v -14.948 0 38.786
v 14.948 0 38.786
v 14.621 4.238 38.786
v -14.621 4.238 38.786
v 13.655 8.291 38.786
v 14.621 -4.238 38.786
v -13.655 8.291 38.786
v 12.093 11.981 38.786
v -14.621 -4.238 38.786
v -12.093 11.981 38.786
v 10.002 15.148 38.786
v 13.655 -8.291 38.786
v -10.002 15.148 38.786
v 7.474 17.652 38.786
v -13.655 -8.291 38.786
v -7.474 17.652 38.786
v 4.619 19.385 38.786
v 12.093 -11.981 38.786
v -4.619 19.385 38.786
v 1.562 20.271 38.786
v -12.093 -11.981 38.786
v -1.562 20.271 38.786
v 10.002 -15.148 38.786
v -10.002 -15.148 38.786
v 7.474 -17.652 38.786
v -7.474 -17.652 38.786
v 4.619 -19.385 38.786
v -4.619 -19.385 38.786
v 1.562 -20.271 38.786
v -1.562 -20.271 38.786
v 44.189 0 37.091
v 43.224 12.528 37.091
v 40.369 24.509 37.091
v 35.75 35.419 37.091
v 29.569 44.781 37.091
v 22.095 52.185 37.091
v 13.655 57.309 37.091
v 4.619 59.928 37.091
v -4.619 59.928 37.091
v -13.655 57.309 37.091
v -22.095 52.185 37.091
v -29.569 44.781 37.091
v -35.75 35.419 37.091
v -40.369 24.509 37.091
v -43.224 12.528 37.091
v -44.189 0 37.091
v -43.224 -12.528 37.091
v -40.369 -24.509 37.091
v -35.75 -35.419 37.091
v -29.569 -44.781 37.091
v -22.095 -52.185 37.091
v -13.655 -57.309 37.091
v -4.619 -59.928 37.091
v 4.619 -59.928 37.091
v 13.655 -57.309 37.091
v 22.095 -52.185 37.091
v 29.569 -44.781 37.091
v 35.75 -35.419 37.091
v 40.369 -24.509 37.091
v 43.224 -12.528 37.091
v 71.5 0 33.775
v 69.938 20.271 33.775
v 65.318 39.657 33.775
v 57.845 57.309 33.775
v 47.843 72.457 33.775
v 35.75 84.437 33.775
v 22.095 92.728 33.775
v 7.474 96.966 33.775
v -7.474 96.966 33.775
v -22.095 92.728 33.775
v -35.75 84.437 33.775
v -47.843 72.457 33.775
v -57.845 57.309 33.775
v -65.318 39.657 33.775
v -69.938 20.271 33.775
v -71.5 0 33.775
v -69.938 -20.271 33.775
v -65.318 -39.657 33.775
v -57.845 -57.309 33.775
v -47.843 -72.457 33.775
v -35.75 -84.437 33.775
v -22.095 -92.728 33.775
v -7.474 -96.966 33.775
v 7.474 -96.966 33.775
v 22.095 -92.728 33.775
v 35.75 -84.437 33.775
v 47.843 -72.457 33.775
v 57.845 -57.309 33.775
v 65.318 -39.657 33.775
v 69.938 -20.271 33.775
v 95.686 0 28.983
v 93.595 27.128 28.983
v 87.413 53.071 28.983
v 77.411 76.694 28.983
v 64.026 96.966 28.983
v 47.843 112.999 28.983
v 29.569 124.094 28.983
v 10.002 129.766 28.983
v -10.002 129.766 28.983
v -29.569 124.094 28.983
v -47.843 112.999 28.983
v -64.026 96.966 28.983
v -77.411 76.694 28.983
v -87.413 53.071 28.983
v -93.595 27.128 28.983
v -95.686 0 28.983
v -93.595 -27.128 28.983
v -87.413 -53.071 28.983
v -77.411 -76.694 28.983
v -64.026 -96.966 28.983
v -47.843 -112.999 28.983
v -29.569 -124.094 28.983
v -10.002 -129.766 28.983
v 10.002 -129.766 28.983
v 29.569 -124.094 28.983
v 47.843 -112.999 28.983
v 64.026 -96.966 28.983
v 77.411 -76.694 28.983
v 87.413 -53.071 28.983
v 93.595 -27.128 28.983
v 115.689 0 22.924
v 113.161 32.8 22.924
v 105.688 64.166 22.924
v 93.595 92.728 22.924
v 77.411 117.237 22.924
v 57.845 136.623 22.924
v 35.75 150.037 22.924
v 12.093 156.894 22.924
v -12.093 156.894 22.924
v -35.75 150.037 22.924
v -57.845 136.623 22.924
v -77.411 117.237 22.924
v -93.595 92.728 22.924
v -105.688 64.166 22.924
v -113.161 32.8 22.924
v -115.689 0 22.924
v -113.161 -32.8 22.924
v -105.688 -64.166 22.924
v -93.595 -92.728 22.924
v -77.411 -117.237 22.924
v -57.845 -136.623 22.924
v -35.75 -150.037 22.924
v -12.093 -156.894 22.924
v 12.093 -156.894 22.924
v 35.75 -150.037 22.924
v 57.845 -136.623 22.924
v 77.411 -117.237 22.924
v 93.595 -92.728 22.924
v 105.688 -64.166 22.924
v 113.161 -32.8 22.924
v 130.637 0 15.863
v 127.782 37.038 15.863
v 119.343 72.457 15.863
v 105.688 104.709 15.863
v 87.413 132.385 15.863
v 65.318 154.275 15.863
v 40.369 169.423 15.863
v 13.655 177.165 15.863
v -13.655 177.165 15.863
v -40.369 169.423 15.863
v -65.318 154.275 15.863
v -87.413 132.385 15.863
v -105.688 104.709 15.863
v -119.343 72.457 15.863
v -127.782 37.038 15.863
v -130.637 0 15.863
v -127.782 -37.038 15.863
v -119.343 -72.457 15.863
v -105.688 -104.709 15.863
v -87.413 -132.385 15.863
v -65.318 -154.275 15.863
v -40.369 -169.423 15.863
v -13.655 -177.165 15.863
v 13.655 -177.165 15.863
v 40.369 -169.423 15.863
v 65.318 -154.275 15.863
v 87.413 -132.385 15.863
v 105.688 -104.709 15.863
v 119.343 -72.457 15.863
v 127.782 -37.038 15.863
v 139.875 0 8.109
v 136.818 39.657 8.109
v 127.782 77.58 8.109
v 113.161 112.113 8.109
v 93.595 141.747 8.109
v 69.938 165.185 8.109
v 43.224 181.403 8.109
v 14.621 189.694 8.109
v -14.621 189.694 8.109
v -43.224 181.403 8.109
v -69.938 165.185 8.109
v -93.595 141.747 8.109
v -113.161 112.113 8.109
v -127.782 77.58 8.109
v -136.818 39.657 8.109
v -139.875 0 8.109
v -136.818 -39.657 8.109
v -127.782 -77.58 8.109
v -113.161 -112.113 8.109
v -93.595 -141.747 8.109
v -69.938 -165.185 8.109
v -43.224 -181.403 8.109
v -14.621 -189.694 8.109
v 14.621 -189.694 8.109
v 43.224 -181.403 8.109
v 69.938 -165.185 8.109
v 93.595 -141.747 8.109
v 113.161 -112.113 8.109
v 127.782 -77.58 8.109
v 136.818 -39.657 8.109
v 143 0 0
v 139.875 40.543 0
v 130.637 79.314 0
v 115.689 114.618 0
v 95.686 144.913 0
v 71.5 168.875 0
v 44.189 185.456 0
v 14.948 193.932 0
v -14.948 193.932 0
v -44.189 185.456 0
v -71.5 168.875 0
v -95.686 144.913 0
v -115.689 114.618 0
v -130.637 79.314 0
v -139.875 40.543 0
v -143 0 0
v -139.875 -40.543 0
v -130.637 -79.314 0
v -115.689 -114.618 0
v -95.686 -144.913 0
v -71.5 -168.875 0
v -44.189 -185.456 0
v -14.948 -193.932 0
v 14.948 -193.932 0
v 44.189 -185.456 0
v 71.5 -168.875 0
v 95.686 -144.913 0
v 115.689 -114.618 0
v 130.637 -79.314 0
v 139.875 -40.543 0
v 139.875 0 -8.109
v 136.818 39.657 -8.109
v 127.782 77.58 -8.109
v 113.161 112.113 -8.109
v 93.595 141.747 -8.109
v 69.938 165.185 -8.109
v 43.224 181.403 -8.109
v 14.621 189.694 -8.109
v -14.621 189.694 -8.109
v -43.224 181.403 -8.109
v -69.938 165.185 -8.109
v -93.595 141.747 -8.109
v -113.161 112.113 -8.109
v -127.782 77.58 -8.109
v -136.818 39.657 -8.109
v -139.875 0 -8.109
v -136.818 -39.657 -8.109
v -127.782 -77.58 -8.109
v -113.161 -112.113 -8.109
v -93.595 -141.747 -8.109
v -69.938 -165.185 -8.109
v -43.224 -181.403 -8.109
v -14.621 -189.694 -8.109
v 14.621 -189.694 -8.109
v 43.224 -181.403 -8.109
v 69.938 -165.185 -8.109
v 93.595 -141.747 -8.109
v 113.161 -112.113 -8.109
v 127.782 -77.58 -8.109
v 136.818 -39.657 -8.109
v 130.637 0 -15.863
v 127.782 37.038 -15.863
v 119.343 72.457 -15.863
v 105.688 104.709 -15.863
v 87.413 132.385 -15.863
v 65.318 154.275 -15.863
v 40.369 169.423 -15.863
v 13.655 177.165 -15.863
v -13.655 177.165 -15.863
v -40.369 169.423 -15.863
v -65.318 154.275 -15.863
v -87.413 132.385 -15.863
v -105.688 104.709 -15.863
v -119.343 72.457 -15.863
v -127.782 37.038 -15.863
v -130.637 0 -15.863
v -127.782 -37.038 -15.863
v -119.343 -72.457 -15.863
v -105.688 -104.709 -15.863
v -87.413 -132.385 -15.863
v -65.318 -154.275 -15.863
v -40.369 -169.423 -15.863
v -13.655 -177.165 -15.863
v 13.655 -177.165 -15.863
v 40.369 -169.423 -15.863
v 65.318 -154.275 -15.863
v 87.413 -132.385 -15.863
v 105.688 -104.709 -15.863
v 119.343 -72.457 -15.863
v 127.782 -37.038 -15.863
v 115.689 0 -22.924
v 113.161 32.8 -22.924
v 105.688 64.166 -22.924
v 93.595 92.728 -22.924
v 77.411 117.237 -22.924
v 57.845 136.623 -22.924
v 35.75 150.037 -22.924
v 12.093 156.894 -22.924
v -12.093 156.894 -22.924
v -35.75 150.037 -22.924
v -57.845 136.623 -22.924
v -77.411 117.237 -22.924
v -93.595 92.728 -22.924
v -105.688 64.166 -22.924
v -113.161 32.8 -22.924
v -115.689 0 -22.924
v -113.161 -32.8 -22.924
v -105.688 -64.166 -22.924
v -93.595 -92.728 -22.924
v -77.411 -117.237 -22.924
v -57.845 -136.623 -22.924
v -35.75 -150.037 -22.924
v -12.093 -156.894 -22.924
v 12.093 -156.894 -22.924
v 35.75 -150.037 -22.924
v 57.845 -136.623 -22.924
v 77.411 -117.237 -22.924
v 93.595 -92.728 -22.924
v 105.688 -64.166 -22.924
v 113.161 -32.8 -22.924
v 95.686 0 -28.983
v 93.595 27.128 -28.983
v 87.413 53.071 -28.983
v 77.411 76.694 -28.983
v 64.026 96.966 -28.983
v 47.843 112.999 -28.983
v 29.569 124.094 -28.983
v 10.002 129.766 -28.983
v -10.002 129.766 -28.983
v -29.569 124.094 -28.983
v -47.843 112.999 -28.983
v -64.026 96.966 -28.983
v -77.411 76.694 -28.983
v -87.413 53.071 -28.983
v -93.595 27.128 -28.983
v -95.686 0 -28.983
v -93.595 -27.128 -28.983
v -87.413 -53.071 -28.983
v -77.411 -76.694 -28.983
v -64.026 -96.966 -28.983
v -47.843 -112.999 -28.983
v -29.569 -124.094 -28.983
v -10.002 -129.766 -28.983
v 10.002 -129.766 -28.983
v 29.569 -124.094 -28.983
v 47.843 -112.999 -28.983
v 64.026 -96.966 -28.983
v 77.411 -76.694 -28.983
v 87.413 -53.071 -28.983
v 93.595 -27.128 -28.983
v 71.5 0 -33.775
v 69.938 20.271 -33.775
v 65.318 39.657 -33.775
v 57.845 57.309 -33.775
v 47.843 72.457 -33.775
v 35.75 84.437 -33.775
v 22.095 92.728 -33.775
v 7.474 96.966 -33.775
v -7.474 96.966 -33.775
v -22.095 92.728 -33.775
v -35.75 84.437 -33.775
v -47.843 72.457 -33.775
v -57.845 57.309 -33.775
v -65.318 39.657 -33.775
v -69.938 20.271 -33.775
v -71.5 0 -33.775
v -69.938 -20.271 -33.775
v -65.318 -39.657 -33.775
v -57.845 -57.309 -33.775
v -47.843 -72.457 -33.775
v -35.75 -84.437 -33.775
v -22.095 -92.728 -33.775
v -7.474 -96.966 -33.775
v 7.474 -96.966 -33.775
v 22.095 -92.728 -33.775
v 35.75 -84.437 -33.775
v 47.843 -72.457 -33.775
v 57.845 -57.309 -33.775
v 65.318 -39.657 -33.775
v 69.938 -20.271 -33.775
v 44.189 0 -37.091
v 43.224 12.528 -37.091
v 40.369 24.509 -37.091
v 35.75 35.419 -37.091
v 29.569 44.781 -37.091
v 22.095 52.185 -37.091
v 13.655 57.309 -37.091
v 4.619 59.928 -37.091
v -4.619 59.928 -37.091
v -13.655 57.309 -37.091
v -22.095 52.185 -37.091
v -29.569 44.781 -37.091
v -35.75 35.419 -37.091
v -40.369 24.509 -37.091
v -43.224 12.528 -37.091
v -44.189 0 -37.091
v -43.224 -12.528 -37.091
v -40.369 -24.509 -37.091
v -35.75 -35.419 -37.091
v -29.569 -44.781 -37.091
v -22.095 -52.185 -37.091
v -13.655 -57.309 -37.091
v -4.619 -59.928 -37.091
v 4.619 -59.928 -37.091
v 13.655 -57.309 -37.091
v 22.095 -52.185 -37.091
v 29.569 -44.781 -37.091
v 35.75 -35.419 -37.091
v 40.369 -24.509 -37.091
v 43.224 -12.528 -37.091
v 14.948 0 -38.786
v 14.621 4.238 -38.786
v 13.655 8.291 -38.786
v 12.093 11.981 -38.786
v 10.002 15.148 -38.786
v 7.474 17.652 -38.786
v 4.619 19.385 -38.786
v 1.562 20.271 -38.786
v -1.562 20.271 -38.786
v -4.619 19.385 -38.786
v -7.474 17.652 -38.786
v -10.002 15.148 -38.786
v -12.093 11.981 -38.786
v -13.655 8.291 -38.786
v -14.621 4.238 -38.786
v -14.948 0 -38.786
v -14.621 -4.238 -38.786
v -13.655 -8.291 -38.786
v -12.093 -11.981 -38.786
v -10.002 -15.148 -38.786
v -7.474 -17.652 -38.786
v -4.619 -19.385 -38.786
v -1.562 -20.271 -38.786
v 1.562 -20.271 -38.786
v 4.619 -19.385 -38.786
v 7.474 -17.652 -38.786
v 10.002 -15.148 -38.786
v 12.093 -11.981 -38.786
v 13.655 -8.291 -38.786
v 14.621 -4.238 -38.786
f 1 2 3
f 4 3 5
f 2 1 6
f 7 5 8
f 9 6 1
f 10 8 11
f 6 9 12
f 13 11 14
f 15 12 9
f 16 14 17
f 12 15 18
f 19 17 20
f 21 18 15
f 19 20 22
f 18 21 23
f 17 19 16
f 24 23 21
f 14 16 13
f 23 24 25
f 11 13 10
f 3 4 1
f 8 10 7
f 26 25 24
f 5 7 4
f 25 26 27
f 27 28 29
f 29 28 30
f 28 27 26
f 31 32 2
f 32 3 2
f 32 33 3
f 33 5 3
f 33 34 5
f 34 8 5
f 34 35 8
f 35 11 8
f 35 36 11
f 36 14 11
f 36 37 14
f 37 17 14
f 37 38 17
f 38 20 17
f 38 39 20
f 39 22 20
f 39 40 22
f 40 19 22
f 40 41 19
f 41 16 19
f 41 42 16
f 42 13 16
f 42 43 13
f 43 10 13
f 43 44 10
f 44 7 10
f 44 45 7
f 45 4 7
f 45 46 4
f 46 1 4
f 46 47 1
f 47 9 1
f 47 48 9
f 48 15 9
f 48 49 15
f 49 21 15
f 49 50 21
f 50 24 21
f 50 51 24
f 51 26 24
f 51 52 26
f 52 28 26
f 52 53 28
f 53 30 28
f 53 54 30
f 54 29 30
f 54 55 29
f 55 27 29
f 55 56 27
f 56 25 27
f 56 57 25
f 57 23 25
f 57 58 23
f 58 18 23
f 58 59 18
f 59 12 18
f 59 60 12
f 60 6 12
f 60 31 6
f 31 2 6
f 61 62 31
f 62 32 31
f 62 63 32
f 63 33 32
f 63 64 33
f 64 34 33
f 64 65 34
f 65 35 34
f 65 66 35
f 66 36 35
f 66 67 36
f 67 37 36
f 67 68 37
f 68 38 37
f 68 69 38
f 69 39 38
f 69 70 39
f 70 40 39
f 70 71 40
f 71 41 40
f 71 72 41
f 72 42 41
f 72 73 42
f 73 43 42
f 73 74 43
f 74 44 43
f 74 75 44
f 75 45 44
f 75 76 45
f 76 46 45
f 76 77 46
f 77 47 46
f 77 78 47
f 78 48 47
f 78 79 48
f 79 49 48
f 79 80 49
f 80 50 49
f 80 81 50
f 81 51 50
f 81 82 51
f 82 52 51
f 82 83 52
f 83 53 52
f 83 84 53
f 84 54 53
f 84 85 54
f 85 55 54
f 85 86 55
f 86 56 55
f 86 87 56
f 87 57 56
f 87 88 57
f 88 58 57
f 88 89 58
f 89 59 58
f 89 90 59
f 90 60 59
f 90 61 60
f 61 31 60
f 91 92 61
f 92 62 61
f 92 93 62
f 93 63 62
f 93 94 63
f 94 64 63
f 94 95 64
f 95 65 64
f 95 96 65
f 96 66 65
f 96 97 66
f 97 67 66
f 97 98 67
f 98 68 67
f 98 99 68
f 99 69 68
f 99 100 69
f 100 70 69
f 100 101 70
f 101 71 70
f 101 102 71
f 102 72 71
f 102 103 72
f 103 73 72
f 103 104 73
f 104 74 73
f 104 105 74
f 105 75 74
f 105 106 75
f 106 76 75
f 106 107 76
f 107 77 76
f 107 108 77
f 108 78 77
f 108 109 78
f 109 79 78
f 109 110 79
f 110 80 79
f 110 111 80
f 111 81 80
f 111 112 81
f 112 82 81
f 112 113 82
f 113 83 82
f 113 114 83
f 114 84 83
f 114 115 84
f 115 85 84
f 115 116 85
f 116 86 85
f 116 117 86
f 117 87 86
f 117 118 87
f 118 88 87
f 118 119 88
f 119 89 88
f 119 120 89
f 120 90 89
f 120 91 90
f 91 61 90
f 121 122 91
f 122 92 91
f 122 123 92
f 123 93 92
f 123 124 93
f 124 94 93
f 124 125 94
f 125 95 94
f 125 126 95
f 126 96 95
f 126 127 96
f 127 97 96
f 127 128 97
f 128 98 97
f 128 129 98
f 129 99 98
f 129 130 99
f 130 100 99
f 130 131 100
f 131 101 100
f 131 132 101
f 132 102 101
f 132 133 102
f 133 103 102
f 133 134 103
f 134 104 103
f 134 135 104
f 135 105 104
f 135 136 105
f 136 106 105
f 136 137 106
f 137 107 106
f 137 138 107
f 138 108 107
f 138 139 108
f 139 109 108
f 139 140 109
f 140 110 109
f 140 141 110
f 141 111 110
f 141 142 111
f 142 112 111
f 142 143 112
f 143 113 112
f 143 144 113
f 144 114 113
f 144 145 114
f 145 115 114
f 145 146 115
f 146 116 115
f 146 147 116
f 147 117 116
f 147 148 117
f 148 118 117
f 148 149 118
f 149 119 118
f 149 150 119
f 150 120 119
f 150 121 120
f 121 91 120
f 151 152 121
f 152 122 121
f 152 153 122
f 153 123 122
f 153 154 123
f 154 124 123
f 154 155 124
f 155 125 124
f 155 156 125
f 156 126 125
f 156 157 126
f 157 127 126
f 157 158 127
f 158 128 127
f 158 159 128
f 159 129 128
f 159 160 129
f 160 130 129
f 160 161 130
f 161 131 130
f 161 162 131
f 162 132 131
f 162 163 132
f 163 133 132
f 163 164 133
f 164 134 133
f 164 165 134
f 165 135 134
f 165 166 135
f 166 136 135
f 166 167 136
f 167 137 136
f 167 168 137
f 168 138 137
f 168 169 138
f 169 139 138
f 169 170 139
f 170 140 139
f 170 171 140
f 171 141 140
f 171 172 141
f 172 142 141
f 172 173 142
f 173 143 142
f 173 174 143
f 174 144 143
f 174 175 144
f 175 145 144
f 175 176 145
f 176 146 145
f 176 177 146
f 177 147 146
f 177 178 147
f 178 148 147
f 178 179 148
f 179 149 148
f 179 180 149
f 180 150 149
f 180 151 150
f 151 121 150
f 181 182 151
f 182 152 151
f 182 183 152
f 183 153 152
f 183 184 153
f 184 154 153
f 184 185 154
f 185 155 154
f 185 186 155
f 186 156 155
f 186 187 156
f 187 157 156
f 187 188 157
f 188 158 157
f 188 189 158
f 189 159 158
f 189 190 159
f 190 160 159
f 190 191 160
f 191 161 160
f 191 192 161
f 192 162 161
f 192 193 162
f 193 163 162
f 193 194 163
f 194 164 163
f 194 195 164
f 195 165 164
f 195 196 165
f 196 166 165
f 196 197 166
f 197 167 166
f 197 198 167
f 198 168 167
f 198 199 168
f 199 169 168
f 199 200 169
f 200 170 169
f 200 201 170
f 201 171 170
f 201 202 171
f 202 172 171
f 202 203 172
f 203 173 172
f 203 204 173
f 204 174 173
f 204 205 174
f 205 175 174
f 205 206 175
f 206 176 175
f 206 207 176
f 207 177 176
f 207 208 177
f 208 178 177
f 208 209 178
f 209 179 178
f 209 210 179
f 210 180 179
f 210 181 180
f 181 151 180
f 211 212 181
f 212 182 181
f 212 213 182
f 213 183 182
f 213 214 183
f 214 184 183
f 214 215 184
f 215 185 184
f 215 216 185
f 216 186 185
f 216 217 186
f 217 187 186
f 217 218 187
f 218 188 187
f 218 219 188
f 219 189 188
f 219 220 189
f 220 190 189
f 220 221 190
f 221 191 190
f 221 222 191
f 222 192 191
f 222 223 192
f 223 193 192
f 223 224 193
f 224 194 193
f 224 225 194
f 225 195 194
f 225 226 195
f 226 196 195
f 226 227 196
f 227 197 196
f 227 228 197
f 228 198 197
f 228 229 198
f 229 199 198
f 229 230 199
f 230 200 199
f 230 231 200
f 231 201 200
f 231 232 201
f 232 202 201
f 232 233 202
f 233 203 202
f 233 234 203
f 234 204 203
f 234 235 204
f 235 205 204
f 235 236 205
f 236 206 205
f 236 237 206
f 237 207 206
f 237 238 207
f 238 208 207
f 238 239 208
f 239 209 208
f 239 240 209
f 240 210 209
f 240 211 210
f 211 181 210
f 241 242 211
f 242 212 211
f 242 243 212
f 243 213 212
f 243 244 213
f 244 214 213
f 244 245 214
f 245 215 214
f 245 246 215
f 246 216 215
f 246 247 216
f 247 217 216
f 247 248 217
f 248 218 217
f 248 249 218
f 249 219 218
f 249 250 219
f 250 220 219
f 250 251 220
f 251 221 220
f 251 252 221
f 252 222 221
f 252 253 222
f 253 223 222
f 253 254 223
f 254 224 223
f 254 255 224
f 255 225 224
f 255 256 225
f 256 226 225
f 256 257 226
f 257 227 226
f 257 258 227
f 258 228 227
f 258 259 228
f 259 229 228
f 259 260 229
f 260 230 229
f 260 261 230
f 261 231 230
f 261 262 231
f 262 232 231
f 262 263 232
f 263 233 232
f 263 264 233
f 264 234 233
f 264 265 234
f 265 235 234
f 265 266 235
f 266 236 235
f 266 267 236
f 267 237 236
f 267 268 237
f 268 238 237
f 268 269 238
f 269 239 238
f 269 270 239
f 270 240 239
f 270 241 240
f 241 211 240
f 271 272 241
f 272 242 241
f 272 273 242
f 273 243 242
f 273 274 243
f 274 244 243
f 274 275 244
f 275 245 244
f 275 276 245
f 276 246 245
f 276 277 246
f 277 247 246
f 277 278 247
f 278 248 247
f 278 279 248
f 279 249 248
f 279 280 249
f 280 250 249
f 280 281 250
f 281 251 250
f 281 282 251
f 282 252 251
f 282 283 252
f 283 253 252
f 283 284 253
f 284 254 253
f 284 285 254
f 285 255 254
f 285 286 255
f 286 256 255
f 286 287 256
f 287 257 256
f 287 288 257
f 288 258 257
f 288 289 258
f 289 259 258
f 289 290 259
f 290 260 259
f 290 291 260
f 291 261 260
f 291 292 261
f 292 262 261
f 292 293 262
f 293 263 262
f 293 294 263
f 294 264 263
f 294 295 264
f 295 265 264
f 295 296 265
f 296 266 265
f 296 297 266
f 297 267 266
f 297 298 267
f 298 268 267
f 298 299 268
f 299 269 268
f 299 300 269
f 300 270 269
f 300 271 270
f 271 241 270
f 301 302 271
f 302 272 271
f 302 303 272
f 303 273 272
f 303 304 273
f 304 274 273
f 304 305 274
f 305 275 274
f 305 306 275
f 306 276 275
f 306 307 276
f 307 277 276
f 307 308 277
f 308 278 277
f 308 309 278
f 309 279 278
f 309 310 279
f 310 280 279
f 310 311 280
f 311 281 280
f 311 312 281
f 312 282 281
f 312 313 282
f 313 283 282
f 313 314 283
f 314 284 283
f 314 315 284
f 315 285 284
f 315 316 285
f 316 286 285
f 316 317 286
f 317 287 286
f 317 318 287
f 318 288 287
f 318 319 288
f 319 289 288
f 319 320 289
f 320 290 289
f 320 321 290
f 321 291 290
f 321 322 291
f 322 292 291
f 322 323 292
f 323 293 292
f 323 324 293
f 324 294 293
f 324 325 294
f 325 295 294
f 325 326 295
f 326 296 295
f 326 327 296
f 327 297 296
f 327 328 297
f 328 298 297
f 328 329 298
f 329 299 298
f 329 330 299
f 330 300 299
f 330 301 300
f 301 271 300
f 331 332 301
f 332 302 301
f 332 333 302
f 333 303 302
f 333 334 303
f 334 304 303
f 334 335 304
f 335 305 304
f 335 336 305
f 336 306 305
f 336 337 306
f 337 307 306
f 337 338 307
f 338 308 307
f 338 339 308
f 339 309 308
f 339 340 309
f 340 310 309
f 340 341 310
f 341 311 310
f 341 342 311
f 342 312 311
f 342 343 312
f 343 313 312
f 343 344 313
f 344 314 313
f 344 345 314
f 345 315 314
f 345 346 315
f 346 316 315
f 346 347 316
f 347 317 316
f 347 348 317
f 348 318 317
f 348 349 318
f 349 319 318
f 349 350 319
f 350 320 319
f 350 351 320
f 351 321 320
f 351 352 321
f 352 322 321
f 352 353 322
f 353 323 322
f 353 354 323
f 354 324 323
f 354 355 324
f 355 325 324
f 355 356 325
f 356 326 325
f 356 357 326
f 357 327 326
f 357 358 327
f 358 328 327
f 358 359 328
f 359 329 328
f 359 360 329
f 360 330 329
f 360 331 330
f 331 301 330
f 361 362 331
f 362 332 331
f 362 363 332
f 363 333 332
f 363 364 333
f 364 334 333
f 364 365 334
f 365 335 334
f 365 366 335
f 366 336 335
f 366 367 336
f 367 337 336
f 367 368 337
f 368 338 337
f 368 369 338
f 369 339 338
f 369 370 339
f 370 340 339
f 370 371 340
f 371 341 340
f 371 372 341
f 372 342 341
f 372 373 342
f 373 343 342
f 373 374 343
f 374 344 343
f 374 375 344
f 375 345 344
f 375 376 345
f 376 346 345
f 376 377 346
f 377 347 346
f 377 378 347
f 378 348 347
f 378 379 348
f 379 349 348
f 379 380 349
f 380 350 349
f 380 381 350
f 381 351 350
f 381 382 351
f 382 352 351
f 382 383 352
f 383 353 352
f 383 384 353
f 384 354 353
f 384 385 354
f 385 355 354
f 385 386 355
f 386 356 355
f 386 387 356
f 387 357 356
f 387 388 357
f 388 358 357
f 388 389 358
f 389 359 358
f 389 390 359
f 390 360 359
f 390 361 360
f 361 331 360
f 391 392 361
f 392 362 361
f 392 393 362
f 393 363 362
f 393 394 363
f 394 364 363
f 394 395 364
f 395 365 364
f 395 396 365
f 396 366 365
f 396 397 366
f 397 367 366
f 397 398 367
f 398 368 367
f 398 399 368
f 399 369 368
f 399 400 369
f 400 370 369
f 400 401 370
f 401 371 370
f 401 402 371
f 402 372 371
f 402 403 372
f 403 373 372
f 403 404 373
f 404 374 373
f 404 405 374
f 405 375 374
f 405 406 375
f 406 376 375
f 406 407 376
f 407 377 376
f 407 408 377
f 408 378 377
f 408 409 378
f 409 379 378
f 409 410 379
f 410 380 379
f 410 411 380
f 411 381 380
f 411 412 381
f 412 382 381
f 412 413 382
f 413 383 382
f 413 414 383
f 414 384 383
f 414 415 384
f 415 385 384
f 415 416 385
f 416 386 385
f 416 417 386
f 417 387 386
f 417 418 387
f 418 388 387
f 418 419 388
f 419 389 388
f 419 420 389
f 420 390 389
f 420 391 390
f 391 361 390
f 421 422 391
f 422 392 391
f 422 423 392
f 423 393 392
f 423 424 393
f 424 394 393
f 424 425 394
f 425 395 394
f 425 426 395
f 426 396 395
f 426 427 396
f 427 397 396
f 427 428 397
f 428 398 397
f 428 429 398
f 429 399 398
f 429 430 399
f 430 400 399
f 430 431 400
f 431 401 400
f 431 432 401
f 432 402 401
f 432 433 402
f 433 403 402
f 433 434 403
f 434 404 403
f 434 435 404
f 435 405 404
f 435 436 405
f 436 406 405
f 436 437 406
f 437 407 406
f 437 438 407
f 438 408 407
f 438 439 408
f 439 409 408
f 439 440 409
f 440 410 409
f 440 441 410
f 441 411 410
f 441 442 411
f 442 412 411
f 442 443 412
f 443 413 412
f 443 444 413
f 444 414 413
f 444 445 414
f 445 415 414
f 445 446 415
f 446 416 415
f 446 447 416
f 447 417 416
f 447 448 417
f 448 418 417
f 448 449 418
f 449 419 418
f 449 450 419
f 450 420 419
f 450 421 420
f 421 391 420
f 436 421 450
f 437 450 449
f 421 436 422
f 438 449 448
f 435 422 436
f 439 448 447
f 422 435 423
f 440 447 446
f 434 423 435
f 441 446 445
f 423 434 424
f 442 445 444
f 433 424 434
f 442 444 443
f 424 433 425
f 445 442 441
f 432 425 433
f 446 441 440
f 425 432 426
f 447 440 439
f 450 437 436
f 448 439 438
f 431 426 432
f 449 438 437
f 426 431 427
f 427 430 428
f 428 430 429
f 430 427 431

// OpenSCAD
// Generated by SolidPython 1.0.1 on 2020-07-29 00:46:50


scale(v = [11, 15, 3]) {
	sphere(r = 13);
}
/***********************************************
*********      SolidPython code:      **********
************************************************
 
# import packages: SolidPython
from solid import *
from solid.utils import *
from itertools import chain, combinations, permutations


class Resize:

    def __init__(self, scad_file):
        self.scad_file = scad_file
        #self.scad_file = import_scad(scad_file)
        # cone/cylinder param:
        self.r1 = 0
        self.r2 = 0
        self.h = 0
        # rectangular prism param:
        self.w = 0
        self.l = 0
        # ellipse param:
        self.r = 0

    # import OpenScad code (file name corresponds to shape)


    # classify shape + parameters
    def assign(self, param1, param2, param3):
        if self.scad_file == 'cone.scad':
            self.r1 = param1
            self.r2 = param2
            self.h = param3
        elif self.scad_file == 'cylinder.scad':
            self.r1 = param1
            self.r2 = param2
            self.h = param3
        elif self.scad_file == 'rectangularPrism.scad':
            self.h = param1
            self.l = param2
            self.w = param3
        else:
            self.r = param1
            self.h = param2

    # resize parameters
    def iterate(self):
        x = range(3, 20, 2)
        i = 1
        if self.scad_file == 'cone.scad':
            tempList = list(permutations(x, 2))
            for temp in tempList:
                param1 = temp[0]
                param2 = temp[1]
                filepath = 'produced_scad_files/' + 'cone' + str(param1) + '_' + str(param2) + '_' + '.scad'
                scad_render_to_file(cylinder(h=param1, r1=param2, r2=0), filepath)

        elif self.scad_file == 'cylinder.scad':
            tempList = list(permutations(x, 3))
            for temp in tempList:
                param1 = temp[0]
                param2 = temp[1]
                filepath = 'produced_scad_files/' + 'cylinder' + str(param1) + '_' + str(param2) + '_' + '.scad'
                scad_render_to_file(cylinder(h=param1, r1=param2, r2=param2), filepath)

        elif self.scad_file == 'rectangularPrism.scad':
            tempList = list(permutations(x, 3))
            for temp in tempList:
                param1 = temp[0]
                param2 = temp[1]
                param3 = temp[2]
                filepath = 'produced_scad_files/' + 'rectangularPrism' + str(param1) + '_' + str(param2) + '_' + str(
                    param3) + '.scad'
                scad_render_to_file(cube(size=(param1, param2, param3)), filepath)

        elif self.scad_file == 'ellipse.scad':
            tempList = list(permutations(x, 4))
            for temp in tempList:
                param1 = temp[0]
                param2 = temp[1]
                param3 = temp[2]
                param4 = temp[3]
                filepath = 'produced_scad_files/' + 'ellipse' + str(param1) + '_' + str(param2) + '_' + str(param3) + '_' + str(param4) + '.scad'
                scad_render_to_file(scale([param1, param2, param3])(sphere(r=param4)), filepath)

    def render_to_scadfile(self):
        scad_render_to_file(scad, 'example.scad') 
 
************************************************/
